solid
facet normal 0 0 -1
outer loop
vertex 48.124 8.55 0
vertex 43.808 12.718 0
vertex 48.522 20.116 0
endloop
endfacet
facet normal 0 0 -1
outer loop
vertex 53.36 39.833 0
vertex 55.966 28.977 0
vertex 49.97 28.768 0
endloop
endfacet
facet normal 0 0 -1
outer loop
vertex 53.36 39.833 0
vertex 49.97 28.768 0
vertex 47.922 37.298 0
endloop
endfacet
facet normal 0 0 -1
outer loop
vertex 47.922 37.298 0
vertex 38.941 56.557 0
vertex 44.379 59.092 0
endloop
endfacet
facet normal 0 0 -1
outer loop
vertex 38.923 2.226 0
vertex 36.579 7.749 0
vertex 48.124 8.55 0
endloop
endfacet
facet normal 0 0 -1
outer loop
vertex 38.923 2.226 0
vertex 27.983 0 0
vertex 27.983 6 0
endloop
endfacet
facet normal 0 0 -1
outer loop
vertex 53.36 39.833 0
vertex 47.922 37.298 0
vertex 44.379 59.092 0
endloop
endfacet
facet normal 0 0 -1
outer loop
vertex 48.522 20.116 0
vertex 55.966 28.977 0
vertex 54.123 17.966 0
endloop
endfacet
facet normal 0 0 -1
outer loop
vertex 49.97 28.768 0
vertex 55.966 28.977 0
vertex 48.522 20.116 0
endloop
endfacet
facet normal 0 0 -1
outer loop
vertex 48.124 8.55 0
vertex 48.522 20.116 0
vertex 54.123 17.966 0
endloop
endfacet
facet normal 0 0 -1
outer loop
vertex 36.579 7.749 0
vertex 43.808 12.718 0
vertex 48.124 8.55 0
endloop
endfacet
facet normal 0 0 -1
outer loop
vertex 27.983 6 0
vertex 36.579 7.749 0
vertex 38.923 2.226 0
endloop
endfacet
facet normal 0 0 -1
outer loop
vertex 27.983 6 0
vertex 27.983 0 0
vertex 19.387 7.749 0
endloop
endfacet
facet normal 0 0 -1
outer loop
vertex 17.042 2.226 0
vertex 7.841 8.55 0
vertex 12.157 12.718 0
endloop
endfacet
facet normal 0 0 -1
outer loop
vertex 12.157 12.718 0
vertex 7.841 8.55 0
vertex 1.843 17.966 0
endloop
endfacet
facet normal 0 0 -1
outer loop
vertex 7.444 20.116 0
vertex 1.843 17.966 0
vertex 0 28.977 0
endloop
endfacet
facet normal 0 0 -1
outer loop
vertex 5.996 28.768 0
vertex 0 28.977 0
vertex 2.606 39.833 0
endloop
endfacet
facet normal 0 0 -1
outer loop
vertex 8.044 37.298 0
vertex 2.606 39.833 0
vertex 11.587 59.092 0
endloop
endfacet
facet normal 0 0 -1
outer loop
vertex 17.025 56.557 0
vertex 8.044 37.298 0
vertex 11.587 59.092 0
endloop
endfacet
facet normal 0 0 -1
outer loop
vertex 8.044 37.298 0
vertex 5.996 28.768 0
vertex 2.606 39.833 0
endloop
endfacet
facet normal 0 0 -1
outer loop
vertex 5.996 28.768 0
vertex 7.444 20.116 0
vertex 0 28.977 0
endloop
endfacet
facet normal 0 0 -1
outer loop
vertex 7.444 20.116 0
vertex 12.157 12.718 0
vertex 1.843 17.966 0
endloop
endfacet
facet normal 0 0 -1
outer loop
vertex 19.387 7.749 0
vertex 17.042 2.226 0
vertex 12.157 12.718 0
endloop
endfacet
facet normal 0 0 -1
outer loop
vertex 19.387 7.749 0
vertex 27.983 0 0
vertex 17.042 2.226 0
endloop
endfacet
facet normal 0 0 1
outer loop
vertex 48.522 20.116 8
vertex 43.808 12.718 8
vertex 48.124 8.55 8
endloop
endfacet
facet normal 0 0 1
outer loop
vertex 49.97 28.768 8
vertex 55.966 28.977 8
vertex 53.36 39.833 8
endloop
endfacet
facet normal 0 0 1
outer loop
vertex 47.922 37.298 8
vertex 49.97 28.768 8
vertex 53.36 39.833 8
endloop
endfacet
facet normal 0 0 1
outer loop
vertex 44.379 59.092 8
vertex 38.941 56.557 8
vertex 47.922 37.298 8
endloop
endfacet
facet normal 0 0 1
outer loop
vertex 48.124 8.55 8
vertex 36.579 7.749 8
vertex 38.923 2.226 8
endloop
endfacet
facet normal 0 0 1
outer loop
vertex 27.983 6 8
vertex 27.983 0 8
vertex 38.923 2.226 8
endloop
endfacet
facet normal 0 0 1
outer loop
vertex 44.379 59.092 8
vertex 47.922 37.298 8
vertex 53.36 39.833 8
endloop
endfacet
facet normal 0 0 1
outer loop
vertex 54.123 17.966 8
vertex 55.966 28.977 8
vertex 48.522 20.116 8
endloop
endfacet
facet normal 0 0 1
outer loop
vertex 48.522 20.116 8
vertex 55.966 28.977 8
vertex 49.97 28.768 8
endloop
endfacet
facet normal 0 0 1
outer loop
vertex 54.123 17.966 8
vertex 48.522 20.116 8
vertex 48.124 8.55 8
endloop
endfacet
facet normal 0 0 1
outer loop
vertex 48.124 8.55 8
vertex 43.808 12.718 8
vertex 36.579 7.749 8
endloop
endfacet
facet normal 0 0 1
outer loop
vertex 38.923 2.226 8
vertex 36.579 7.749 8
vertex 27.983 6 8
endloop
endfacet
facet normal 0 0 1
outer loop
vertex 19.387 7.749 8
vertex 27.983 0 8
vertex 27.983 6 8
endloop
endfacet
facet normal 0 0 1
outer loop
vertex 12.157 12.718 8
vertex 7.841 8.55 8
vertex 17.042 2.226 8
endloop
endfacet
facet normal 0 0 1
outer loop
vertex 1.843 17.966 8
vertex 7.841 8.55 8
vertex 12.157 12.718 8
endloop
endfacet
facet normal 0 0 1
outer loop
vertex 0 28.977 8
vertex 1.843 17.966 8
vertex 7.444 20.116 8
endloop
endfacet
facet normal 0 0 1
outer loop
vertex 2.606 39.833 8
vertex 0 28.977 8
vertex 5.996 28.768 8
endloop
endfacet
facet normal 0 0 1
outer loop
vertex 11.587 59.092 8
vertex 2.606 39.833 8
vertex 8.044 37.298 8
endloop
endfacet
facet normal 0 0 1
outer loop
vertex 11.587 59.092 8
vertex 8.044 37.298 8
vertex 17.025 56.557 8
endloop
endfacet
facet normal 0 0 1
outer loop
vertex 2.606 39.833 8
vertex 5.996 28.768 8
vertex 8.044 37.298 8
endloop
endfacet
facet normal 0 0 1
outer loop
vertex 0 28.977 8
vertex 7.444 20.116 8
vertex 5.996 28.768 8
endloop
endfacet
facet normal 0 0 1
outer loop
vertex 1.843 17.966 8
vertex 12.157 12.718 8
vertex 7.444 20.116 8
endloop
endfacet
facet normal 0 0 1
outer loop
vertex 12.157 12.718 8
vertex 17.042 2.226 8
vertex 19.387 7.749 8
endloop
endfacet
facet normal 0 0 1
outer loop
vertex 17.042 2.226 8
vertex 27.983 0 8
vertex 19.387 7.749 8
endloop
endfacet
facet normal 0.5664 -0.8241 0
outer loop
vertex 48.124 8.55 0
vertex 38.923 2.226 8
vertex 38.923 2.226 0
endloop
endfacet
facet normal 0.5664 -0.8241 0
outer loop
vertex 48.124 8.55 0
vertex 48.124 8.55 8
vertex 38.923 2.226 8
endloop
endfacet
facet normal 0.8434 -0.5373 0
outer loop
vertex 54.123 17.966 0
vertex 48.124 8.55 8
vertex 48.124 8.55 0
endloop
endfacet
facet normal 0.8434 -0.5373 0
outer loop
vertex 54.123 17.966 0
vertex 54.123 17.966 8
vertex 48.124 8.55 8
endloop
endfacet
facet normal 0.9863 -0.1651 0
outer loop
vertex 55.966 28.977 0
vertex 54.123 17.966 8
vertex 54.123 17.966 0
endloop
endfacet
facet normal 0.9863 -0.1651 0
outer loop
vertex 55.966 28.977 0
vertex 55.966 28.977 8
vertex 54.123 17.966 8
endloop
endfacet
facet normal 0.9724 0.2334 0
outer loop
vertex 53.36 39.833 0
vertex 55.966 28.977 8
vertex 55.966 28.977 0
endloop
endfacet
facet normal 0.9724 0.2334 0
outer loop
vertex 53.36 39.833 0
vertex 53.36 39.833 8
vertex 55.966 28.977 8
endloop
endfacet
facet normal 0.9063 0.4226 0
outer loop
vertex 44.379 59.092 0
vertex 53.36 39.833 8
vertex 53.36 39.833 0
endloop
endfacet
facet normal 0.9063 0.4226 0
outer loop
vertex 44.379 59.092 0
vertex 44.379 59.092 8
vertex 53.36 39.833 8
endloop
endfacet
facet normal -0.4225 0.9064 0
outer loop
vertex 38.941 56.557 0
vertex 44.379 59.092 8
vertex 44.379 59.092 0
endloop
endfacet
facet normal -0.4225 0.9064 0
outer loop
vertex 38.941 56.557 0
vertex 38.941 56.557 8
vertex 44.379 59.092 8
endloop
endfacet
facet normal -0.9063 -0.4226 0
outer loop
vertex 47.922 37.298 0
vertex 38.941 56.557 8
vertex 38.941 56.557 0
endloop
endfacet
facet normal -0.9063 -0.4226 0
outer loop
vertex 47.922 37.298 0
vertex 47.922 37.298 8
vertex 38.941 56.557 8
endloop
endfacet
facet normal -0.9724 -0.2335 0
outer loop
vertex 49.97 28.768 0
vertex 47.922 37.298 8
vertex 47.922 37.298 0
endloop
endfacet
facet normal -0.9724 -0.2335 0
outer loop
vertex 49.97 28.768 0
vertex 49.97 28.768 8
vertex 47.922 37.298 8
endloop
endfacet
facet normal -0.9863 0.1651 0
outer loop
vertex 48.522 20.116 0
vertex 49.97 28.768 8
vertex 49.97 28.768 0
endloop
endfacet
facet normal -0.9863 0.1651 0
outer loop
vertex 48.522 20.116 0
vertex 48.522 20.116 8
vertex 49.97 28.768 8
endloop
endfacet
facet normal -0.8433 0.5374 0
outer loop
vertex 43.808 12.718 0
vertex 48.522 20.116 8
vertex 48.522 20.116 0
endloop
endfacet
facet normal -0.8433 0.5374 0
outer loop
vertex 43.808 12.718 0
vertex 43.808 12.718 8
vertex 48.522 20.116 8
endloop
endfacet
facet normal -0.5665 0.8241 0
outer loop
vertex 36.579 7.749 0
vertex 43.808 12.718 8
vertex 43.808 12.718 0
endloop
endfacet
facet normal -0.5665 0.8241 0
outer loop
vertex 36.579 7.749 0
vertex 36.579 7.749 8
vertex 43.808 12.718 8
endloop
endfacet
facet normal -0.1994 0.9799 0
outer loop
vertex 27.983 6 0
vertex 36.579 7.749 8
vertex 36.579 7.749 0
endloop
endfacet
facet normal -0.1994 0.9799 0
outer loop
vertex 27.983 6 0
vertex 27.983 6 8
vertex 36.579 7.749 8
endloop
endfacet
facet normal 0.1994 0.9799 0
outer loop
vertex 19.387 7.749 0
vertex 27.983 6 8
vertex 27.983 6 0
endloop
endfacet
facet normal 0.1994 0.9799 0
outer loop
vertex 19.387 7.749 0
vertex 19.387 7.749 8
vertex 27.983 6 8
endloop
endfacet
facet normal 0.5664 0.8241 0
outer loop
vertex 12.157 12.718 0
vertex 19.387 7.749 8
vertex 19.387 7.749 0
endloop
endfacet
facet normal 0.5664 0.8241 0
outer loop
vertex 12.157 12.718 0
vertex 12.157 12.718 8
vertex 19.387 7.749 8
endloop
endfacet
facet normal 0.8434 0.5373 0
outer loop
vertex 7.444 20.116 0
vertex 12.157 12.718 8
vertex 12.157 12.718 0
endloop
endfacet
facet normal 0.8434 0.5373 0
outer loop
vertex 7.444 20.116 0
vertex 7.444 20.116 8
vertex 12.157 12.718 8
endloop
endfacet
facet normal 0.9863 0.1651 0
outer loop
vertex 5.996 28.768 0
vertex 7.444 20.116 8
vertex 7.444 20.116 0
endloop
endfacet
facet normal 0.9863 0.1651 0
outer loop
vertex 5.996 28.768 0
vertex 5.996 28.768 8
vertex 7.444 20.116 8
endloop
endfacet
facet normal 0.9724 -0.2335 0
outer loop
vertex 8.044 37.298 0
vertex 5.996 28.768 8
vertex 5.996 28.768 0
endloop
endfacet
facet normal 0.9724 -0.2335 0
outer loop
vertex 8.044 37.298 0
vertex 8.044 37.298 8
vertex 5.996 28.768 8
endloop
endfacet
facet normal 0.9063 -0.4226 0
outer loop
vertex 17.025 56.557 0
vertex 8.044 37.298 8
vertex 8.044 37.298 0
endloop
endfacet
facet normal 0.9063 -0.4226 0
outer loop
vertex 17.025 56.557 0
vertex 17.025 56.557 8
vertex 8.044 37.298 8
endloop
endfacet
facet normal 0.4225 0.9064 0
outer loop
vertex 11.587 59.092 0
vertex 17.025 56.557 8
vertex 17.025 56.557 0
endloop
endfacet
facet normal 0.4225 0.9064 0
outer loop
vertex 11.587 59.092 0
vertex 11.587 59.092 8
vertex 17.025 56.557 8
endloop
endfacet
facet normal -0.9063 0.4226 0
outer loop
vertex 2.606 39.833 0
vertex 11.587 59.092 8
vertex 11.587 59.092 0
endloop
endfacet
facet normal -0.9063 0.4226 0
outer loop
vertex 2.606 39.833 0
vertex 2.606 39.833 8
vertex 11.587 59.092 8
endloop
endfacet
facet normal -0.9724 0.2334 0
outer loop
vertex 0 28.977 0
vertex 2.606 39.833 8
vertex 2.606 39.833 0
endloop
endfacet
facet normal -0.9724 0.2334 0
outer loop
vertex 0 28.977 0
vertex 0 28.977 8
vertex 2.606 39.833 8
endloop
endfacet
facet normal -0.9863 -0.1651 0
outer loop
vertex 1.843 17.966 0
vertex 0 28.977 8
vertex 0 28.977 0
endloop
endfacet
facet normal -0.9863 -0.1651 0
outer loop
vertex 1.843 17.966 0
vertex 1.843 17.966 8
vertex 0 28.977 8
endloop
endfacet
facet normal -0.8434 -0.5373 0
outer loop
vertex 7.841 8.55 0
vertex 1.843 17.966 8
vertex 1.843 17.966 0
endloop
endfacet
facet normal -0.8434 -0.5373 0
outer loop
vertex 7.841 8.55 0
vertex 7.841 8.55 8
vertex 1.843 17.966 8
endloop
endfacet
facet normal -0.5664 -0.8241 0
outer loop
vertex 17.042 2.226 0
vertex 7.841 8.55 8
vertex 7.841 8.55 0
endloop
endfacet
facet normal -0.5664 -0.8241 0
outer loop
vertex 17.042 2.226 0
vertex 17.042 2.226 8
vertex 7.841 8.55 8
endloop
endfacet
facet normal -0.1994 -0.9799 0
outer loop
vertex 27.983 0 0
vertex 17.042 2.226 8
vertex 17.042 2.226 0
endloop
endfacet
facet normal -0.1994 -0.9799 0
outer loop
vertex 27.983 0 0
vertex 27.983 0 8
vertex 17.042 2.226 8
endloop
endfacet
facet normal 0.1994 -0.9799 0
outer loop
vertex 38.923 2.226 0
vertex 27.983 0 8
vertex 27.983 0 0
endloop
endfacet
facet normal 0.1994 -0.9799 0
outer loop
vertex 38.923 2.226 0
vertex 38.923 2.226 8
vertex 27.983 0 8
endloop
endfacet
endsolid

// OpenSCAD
$fn = 32;

// ----------------------------------------------------------------------
// Clip blank: omega clip, 8 mm thick
// ----------------------------------------------------------------------

// --- parameters (mm) ---
profile_height = 8;       // extrusion height
profile_points = 26;      // points of the closed outline

profile = [[2.606, 39.833], [0, 28.977], [1.843, 17.966], [7.841, 8.55], [17.042, 2.226], [27.983, 0], [38.923, 2.226], [48.124, 8.55], [54.123, 17.966], [55.966, 28.977], [53.36, 39.833], [44.379, 59.092], [38.941, 56.557], [47.922, 37.298], [49.97, 28.768], [48.522, 20.116], [43.808, 12.718], [36.579, 7.749], [27.983, 6], [19.387, 7.749], [12.157, 12.718], [7.444, 20.116], [5.996, 28.768], [8.044, 37.298], [17.025, 56.557], [11.587, 59.092]];  // single closed polygon, 26 points, counter clockwise

// --- the one profile operation ---
linear_extrude(height = profile_height) polygon(points = profile);
